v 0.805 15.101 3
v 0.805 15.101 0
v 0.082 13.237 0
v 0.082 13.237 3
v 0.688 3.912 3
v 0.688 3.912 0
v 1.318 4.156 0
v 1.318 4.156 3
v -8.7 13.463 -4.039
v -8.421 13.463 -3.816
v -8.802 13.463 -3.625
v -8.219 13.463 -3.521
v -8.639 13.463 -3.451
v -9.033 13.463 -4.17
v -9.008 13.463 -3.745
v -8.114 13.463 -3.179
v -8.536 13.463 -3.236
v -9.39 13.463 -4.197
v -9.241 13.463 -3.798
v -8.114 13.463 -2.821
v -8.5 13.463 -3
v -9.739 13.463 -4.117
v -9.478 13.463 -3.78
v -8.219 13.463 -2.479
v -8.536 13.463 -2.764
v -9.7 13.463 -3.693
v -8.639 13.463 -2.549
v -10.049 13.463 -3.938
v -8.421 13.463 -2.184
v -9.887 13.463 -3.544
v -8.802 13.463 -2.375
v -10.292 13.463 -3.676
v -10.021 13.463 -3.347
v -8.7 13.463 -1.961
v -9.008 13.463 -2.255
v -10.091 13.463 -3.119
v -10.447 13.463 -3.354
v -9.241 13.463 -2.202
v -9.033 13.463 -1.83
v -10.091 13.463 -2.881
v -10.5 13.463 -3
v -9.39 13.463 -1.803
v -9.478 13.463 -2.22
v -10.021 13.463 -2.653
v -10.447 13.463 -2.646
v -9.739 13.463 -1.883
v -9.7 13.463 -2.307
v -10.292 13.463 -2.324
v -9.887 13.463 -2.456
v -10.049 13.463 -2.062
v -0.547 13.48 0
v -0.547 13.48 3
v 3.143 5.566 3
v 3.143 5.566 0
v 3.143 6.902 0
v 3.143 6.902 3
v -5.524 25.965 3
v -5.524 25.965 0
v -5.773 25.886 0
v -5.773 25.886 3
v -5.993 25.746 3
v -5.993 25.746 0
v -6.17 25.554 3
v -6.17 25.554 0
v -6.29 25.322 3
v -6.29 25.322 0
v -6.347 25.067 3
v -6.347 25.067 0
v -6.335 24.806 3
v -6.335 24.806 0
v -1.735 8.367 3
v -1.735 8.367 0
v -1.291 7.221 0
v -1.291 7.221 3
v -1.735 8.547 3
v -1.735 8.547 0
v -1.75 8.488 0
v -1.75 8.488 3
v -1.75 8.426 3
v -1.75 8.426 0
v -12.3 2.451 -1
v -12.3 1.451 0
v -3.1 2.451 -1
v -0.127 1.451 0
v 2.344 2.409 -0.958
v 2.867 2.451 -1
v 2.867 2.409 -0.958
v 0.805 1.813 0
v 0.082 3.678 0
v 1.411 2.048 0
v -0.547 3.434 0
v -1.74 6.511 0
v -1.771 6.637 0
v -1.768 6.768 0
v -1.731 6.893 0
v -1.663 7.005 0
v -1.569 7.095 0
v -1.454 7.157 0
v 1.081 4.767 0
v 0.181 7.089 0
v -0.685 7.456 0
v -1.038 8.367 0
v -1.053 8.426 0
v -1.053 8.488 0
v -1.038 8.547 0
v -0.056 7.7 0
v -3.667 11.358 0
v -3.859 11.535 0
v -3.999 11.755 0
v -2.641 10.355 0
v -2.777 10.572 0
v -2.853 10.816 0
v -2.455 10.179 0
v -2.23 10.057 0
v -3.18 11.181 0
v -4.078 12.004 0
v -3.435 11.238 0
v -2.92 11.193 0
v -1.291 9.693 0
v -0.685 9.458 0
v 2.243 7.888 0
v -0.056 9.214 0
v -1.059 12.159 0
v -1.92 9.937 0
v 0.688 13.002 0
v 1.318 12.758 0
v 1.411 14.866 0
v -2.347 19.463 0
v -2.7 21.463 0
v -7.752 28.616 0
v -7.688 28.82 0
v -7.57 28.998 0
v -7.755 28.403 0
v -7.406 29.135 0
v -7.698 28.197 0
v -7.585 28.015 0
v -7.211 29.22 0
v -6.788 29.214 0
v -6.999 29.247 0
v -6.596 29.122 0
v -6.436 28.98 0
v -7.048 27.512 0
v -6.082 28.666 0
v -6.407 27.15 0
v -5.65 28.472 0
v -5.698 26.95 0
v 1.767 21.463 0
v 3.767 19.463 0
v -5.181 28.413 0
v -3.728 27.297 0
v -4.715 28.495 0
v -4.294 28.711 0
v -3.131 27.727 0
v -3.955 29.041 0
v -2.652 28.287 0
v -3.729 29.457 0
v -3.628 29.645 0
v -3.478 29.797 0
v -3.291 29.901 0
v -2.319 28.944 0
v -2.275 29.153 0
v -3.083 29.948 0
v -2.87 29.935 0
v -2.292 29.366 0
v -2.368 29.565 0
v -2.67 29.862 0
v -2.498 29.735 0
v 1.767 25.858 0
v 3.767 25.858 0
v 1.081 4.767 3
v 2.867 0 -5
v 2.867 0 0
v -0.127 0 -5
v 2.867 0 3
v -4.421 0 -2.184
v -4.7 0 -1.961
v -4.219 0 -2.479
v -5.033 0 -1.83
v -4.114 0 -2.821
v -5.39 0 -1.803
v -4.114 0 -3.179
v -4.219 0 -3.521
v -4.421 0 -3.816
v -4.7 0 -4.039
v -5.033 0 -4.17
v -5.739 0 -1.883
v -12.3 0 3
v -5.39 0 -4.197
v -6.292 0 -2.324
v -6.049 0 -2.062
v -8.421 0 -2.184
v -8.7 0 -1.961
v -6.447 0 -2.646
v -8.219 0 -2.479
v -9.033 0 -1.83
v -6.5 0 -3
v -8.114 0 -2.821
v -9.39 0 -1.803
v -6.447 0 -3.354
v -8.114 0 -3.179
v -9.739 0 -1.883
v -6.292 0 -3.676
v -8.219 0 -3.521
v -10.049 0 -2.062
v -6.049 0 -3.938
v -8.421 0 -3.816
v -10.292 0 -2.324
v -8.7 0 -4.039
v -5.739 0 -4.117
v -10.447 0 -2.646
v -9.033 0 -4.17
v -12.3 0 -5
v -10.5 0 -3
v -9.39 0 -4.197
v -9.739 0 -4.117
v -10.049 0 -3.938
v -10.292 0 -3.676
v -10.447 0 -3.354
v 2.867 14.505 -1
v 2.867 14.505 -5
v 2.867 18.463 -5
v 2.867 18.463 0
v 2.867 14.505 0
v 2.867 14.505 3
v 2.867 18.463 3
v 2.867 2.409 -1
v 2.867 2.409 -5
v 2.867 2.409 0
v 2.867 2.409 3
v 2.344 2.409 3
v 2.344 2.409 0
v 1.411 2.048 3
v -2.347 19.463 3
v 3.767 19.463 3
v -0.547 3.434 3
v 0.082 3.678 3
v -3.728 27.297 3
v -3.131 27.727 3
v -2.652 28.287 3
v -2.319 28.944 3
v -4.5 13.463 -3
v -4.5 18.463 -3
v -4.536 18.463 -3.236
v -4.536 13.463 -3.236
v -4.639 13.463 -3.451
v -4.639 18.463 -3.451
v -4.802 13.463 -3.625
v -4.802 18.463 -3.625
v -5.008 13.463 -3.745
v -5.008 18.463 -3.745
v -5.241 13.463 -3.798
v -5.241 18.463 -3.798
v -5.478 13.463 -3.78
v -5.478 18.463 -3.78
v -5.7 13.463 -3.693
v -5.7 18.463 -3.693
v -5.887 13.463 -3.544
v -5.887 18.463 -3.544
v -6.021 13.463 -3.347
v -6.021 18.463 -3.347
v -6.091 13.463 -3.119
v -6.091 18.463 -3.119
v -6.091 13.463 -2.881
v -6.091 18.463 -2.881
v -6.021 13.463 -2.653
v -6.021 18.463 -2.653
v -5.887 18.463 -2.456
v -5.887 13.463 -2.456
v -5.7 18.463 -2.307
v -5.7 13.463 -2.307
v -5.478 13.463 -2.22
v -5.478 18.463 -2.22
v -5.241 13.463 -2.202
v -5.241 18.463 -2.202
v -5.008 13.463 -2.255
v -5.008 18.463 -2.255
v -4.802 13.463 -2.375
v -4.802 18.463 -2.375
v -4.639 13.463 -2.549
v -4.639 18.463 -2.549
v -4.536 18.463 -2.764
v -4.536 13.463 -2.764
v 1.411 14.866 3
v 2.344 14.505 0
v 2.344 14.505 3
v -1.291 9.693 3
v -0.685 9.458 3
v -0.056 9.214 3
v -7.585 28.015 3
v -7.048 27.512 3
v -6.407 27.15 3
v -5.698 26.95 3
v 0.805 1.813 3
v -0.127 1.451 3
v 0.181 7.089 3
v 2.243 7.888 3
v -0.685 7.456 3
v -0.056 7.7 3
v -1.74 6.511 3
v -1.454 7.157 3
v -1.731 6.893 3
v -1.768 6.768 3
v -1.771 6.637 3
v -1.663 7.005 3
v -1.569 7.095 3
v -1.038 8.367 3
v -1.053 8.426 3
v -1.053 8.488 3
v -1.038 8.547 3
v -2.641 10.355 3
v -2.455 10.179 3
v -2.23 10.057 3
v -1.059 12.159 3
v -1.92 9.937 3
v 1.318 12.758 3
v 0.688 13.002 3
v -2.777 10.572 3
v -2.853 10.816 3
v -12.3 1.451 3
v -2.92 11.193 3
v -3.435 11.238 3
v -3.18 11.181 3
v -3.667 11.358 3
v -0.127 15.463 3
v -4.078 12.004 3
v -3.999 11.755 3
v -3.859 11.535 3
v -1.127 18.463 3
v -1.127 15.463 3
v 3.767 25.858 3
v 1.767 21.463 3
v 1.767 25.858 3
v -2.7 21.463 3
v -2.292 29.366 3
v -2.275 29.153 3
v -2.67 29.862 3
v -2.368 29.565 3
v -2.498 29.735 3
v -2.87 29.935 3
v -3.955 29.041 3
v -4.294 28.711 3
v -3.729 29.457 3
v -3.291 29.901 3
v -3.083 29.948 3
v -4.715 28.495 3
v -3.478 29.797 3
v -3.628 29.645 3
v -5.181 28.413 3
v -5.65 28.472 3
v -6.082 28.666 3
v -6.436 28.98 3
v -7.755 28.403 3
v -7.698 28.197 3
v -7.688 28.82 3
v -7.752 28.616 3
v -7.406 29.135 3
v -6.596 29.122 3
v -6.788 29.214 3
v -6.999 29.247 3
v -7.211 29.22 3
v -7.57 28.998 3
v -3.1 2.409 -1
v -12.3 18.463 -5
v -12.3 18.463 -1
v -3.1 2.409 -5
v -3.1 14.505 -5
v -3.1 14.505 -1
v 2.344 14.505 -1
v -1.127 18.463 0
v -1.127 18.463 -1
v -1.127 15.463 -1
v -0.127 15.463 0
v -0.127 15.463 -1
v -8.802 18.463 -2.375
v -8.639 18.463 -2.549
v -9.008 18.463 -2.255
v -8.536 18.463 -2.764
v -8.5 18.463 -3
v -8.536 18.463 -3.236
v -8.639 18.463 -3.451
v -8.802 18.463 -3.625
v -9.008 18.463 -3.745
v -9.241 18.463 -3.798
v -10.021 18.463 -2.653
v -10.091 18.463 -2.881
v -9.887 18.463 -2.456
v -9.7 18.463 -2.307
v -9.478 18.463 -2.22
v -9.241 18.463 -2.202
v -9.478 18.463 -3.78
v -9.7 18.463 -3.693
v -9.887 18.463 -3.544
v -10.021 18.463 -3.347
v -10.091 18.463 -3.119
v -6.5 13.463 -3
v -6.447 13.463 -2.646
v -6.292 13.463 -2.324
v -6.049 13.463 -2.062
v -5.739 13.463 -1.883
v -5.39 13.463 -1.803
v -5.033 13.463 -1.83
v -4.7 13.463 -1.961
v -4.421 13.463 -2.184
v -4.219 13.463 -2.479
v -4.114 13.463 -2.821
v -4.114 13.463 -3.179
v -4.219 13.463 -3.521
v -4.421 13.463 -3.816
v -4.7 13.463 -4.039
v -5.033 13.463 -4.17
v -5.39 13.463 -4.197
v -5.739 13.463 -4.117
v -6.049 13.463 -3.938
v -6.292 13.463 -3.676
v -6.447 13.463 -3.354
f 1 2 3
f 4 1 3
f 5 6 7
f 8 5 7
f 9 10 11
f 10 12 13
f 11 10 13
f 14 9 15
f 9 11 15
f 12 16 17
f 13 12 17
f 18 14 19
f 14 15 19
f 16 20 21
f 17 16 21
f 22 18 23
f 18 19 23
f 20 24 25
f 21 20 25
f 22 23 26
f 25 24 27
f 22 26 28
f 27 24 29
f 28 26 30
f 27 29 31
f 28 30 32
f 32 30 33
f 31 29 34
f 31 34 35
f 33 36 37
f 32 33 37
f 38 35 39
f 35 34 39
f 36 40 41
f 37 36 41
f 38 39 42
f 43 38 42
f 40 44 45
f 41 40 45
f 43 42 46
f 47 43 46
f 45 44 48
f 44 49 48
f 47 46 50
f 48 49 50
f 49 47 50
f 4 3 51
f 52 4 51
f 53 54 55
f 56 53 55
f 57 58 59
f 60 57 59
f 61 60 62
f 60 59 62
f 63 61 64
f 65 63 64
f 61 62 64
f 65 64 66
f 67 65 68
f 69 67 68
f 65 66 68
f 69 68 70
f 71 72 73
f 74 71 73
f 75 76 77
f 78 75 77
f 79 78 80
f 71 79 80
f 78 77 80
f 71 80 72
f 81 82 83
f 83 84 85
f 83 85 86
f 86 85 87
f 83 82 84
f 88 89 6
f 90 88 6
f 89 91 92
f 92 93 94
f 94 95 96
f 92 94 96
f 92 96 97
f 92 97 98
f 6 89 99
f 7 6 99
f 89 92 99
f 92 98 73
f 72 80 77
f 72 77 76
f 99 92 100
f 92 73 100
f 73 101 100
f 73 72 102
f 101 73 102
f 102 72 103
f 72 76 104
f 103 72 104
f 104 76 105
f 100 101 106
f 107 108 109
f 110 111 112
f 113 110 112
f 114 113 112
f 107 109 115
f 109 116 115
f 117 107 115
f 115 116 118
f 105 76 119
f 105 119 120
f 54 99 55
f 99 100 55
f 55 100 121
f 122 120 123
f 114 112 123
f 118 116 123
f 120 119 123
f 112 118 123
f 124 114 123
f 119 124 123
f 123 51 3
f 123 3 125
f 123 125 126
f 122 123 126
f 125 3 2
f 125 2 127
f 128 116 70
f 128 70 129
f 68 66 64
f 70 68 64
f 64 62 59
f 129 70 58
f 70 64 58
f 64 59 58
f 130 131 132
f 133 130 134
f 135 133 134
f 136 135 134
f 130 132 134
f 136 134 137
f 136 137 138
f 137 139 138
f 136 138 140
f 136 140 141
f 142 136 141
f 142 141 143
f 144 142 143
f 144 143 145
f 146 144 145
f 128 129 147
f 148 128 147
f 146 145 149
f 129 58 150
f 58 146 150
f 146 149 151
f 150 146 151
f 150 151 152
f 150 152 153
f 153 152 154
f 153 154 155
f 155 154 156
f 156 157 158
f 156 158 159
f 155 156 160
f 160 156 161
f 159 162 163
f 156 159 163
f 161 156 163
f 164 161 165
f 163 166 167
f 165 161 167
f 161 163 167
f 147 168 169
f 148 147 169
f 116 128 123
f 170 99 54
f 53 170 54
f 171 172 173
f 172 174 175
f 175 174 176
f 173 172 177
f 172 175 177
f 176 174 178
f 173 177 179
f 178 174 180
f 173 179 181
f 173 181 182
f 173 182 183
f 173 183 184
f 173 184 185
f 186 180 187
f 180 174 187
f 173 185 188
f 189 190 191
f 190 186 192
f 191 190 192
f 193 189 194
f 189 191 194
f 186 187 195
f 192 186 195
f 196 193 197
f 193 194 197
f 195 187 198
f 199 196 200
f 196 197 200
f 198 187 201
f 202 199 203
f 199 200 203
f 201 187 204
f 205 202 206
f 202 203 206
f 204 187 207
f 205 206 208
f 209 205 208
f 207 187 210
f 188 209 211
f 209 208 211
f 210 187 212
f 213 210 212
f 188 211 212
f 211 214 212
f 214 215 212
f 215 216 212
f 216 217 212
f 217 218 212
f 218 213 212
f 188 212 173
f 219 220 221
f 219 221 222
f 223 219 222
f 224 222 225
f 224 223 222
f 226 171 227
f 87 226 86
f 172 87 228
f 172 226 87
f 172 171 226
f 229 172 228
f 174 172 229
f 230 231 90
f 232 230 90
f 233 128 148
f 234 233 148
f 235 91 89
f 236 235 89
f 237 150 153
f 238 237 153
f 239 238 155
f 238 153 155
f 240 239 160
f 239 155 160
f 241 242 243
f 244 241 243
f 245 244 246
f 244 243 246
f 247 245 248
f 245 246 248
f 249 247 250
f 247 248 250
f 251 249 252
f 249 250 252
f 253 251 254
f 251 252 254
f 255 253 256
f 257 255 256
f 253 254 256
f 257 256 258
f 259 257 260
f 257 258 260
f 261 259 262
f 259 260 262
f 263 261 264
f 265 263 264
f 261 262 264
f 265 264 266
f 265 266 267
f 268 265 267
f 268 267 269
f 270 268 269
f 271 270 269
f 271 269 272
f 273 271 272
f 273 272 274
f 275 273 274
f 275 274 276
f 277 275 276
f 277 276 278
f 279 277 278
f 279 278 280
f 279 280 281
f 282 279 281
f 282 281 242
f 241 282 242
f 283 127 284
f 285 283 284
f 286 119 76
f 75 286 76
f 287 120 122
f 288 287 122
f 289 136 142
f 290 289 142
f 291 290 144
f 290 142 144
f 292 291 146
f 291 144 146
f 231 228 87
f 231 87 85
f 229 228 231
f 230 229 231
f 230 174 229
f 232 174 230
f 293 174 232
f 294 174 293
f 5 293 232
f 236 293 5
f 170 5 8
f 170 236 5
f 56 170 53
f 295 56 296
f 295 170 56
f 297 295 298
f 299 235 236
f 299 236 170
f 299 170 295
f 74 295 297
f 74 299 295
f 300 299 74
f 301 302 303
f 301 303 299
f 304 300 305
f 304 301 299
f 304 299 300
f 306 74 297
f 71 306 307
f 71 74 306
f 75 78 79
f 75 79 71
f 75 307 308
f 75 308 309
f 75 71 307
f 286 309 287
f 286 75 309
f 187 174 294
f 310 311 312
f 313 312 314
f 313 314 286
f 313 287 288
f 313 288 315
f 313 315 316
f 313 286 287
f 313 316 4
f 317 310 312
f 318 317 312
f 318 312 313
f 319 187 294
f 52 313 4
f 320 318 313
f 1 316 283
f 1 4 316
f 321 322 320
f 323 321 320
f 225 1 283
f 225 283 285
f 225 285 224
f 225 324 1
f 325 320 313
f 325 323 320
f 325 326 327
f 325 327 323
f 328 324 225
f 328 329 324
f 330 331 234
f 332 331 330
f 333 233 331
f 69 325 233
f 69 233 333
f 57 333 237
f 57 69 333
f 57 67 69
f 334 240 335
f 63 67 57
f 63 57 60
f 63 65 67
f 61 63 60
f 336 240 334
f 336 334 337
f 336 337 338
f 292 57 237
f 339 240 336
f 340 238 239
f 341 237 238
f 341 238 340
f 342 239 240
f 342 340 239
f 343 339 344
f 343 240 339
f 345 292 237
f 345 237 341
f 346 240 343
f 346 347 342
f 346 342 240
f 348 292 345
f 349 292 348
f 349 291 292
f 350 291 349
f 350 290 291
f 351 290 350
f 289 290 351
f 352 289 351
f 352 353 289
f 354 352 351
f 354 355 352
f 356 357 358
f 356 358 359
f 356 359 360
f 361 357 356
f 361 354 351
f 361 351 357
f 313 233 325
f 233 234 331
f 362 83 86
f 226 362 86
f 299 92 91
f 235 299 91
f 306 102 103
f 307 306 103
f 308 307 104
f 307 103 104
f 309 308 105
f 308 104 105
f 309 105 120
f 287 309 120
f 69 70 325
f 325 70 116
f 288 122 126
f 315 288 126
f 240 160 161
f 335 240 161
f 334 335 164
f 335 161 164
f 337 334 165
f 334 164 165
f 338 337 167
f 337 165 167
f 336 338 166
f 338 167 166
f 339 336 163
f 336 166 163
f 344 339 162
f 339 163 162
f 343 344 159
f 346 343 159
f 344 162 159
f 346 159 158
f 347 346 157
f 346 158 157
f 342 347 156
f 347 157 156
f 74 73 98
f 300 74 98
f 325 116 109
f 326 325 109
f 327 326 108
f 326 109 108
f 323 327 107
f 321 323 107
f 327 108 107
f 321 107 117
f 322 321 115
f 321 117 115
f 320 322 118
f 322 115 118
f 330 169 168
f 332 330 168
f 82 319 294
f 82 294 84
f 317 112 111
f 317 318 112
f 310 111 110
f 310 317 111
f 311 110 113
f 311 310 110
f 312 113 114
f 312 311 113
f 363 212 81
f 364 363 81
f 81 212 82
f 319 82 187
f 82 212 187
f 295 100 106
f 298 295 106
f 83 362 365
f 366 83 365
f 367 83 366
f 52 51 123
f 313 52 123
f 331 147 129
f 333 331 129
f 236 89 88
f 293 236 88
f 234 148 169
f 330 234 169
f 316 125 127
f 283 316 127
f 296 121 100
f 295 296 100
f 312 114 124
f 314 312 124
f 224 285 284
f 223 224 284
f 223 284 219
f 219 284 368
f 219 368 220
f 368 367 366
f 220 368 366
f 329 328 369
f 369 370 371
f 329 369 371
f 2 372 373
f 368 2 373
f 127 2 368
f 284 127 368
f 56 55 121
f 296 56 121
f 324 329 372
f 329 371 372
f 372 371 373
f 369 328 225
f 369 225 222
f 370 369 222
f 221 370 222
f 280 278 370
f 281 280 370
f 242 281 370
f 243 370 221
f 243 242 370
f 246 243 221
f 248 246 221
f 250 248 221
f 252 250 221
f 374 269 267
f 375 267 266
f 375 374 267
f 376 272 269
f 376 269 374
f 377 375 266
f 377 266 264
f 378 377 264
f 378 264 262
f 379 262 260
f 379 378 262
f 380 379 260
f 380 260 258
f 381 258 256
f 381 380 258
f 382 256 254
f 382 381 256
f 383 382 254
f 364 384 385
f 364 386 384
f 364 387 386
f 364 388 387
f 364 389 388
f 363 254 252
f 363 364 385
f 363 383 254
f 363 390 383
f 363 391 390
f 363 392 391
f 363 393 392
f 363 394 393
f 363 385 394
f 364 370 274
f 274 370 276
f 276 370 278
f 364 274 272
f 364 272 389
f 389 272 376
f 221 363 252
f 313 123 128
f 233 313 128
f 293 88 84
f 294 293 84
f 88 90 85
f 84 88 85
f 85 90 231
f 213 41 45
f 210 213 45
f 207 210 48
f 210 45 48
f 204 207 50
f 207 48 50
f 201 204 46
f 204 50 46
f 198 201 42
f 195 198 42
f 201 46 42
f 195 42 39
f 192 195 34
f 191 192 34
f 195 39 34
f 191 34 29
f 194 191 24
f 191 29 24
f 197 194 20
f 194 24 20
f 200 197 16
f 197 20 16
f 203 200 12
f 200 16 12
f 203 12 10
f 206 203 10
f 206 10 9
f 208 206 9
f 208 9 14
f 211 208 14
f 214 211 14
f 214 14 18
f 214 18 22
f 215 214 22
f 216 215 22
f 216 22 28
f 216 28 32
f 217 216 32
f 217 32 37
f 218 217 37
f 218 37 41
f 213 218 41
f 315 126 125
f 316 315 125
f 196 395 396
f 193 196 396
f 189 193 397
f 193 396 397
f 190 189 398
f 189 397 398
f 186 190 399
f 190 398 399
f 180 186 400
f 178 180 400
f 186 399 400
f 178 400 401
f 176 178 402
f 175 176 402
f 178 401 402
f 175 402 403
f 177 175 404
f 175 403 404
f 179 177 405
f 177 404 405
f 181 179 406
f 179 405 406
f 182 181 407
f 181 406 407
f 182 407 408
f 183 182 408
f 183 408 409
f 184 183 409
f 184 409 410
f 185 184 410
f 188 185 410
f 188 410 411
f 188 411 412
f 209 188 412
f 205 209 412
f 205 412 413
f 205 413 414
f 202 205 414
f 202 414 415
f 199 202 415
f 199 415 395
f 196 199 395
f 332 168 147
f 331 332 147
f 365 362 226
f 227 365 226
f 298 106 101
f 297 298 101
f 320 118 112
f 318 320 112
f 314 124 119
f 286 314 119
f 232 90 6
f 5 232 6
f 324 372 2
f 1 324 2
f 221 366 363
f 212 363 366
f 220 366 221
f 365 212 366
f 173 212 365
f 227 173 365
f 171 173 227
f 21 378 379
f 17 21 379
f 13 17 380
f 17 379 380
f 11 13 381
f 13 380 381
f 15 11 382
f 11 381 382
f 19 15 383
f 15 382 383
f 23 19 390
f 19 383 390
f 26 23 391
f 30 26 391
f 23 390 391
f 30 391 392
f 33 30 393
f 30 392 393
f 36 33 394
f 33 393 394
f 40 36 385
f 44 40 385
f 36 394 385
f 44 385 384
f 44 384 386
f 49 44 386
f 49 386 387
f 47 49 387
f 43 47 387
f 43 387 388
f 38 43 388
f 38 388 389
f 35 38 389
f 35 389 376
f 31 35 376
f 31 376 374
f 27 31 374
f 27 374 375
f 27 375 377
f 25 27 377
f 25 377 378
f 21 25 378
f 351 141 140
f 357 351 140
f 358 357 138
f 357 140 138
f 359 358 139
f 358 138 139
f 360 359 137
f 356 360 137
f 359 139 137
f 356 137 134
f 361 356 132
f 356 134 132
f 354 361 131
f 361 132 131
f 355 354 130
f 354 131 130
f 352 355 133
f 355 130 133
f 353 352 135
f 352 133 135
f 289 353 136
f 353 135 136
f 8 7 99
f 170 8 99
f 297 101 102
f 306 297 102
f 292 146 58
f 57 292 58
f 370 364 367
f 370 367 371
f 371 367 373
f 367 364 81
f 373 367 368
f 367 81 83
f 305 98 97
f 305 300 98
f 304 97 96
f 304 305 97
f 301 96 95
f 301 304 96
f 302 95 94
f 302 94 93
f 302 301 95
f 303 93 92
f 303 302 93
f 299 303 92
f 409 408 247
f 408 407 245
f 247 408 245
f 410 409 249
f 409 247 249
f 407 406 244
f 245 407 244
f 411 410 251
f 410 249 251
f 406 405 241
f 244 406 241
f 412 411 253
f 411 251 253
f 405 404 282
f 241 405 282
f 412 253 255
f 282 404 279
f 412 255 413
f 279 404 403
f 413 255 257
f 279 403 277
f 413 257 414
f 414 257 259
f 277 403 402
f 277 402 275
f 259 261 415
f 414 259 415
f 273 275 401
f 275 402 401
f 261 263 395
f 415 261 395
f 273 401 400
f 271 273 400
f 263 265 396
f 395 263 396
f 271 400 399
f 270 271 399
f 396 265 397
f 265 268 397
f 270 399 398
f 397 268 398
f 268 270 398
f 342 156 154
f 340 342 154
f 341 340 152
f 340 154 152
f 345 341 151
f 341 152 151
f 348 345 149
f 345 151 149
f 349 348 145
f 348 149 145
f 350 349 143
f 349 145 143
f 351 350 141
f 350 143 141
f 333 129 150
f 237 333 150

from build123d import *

# Parameters (mm, degrees)
BOSS_SWITCH_BODY_DEPTH            = 3
SKETCH1_W                         = 2.994375291
SKETCH1_H                         = 2.409101515
SKETCH1_W_2                       = 3.994375291
SKETCH1_H_2                       = 3.957767538
BOSS_FLANGE_WIDTH_DEPTH           = 5
BOSS_FLANGE_HEIGHT_REACH          = 36.354
SKETCH2_W                         = 4
SKETCH2_H                         = 3.957767538
SKETCH2_W_2                       = 8
SKETCH2_H_2                       = 1.451333978
SKETCH17_W                        = 15.1675
SKETCH17_H                        = 4
BOSS_FLANGE_SUPPORT_DEPTH         = 13.053634428
CUT_WALL_GAP_DEPTH                = 1
TAP_DRILL_FOR_M2X0_4_TAP1_D       = 1.6
M2_CLEARANCE_HOLE2_D              = 2.4
M2_CLEARANCE_HOLE2_DEPTH          = 13.462735941
CHAMFER_FLANGE_SUPPORT_3_SIZE     = 1
FILLET1_R                         = 1
FILLET2_R                         = 0.5
SKETCH28_W                        = 5.9675
SKETCH28_H                        = 12.095866891
CUT_PRINT_SUPPORT_CLEARANCE_DEPTH = 33.624103931


with BuildPart() as part:
    # Sketch-SwitchBossUp → Boss-Switch Body (new body)
    with BuildSketch(Plane.XY):
        with BuildLine():
            Line((-5.697895702, 26.949658376), (-5.524247524, 25.964850623))
            ThreePointArc((-5.524247524, 25.964850623), (-6.169751391, 25.553619307), (-6.3354071, 24.806394693))
            Line((-6.3354071, 24.806394693), (-4.07798079, 12.003893904))
            ThreePointArc((-4.07798079, 12.003893904), (-3.666749473, 11.358390037), (-2.919524859, 11.192734328))
            Line((-2.919524859, 11.192734328), (-2.755222696, 10.260930457))
            Line((-2.755222696, 10.260930457), (-1.920417042, 9.937339624))
            Line((-1.920417042, 9.937339624), (-1.291045382, 9.693379968))
            Line((-1.291045382, 9.693379968), (-1.735258621, 8.547390389))
            ThreePointArc((-1.735258621, 8.547390389), (-1.752158006, 8.457034961), (-1.735258621, 8.366679532))
            Line((-1.735258621, 8.366679532), (-1.291045382, 7.220689953))
            Line((-1.291045382, 7.220689953), (-1.920417042, 6.976730297))
            Line((-1.920417042, 6.976730297), (-0.547014535, 3.433600952))
            Line((-0.547014535, 3.433600952), (0.082357125, 3.677560608))
            Line((0.082357125, 3.677560608), (0.805200549, 1.81275569))
            Line((0.805200549, 1.81275569), (-0.12720191, 1.451333978))
            Line((-0.12720191, 1.451333978), (-0.12720191, 0))
            Line((-0.12720191, 0), (2.867173381, 0))
            Line((2.867173381, 0), (2.867173381, 2.409101515))
            Line((2.867173381, 2.409101515), (2.343664607, 2.409101515))
            Line((2.343664607, 2.409101515), (1.411262148, 2.047679803))
            Line((1.411262148, 2.047679803), (0.688418723, 3.912484721))
            Line((0.688418723, 3.912484721), (1.317790383, 4.156444377))
            Line((1.317790383, 4.156444377), (1.081123773, 4.767001302))
            Line((1.081123773, 4.767001302), (3.143260738, 5.566335394))
            Line((3.143260738, 5.566335394), (3.143260738, 6.901787438))
            Line((3.143260738, 6.901787438), (2.24307649, 7.888306327))
            Line((2.24307649, 7.888306327), (0.181054486, 7.089016797))
            Line((0.181054486, 7.089016797), (-0.055612124, 7.699573722))
            Line((-0.055612124, 7.699573722), (-0.684983784, 7.455614066))
            Line((-0.684983784, 7.455614066), (-1.038134762, 8.366679532))
            ThreePointArc((-1.038134762, 8.366679532), (-1.055034148, 8.457034961), (-1.038134762, 8.547390389))
            Line((-1.038134762, 8.547390389), (-0.684983784, 9.458455855))
            Line((-0.684983784, 9.458455855), (-0.055612124, 9.214496199))
            Line((-0.055612124, 9.214496199), (1.317790383, 12.757625544))
            Line((1.317790383, 12.757625544), (0.688418723, 13.0015852))
            Line((0.688418723, 13.0015852), (1.411262148, 14.866390118))
            Line((1.411262148, 14.866390118), (2.343664607, 14.504968406))
            Line((2.343664607, 14.504968406), (2.867173381, 14.504968406))
            Line((2.867173381, 14.504968406), (2.867173381, 18.462735944))
            Line((2.867173381, 18.462735944), (-0.111637615, 18.462735944))
            Line((-0.111637615, 18.462735944), (-1.12720191, 18.462735944))
            Line((-1.12720191, 18.462735944), (-1.12720191, 15.462735944))
            Line((-1.12720191, 15.462735944), (-0.12720191, 15.462735944))
            Line((-0.12720191, 15.462735944), (0.805200549, 15.101314231))
            Line((0.805200549, 15.101314231), (0.082357125, 13.236509313))
            Line((0.082357125, 13.236509313), (-0.547014535, 13.480468969))
            Line((-0.547014535, 13.480468969), (-1.059112089, 12.159350171))
            Line((-1.059112089, 12.159350171), (-2.346896051, 19.462735944))
            Line((-2.346896051, 19.462735944), (3.767173381, 19.462735944))
            Line((3.767173381, 19.462735944), (3.767173381, 25.857619356))
            Line((3.767173381, 25.857619356), (1.767173381, 25.857619356))
            Line((1.767173381, 25.857619356), (1.767173381, 21.462735944))
            Line((1.767173381, 21.462735944), (-2.699550012, 21.462735944))
            Line((-2.699550012, 21.462735944), (-3.728280196, 27.296954732))
            ThreePointArc((-3.728280196, 27.296954732), (-2.874356585, 27.992742953), (-2.319025652, 28.944012807))
            ThreePointArc((-2.319025652, 28.944012807), (-2.76728001, 29.905297381), (-3.728564583, 29.457043022))
            ThreePointArc((-3.728564583, 29.457043022), (-4.944660137, 28.436617692), (-6.436422172, 28.97957467))
            ThreePointArc((-6.436422172, 28.97957467), (-7.493046212, 29.072017295), (-7.585488837, 28.015393255))
            ThreePointArc((-7.585488837, 28.015393255), (-6.738295005, 27.311426358), (-5.697895702, 26.949658376))
        make_face()
    extrude(amount=BOSS_SWITCH_BODY_DEPTH)

    # Sketch1 → Boss-Flange Width (add)
    with BuildSketch(Plane(origin=(0, 0, 0), x_dir=(-1, 0, 0), z_dir=(0, 0, -1))):
        with Locations((-1.369985736, 1.204550758)):
            Rectangle(SKETCH1_W, SKETCH1_H)
        with Locations((-0.869985736, 16.483852175)):
            Rectangle(SKETCH1_W_2, SKETCH1_H_2)
    extrude(amount=BOSS_FLANGE_WIDTH_DEPTH)

    # Boss-Flange Height: up to this face of the body (flat: up to its plane)
    boss_flange_height_end = Plane(part.part.faces().sort_by_distance((-0.12720191, 1.077409098, -1.438016547))[0])
    # Sketch2 → Boss-Flange Height (add, up to the picked face)
    with BuildSketch(Plane(origin=(-12.300326619, 0, 0), x_dir=(0, 0, -1), z_dir=(1, 0, 0)), mode=Mode.PRIVATE) as boss_flange_height_sk1:
        with Locations((3, 16.483852175)):
            Rectangle(SKETCH2_W, SKETCH2_H)
    boss_flange_height_tool1 = split(extrude(boss_flange_height_sk1.sketch, amount=BOSS_FLANGE_HEIGHT_REACH, mode=Mode.PRIVATE), bisect_by=boss_flange_height_end, keep=Keep.BOTH, mode=Mode.PRIVATE)
    # Sketch2 → Boss-Flange Height (add, up to the picked face)
    with BuildSketch(Plane(origin=(-12.300326619, 0, 0), x_dir=(0, 0, -1), z_dir=(1, 0, 0)), mode=Mode.PRIVATE) as boss_flange_height_sk2:
        with Locations((1, 0.725666989)):
            Rectangle(SKETCH2_W_2, SKETCH2_H_2)
    boss_flange_height_tool2 = split(extrude(boss_flange_height_sk2.sketch, amount=BOSS_FLANGE_HEIGHT_REACH, mode=Mode.PRIVATE), bisect_by=boss_flange_height_end, keep=Keep.BOTH, mode=Mode.PRIVATE)
    add(boss_flange_height_tool1.solids().sort_by(Axis((-12.300327, 16.483852, -3), (1, 0, 0)))[0])
    add(boss_flange_height_tool2.solids().sort_by(Axis((-12.300327, 0.725667, -1), (1, 0, 0)))[0])

    # Sketch17 → Boss-Flange Support (add)
    with BuildSketch(Plane.XZ.offset(-1.451333978)):
        with Locations((-4.716576619, -3)):
            Rectangle(SKETCH17_W, SKETCH17_H)
    extrude(amount=-BOSS_FLANGE_SUPPORT_DEPTH)

    # Sketch27 → Cut-Wall Gap (cut)
    with BuildSketch(Plane.XY):
        Polygon((-0.12720191, 15.462735944), (2.343664607, 14.504968406), (-1.12720191, 14.504968406), (-1.12720191, 15.462735944), align=None)
        Polygon((2.343664607, 2.409101515), (-0.12720191, 2.409101515), (-0.12720191, 1.451333978), align=None)
    extrude(amount=-CUT_WALL_GAP_DEPTH, mode=Mode.SUBTRACT)

    # Tap Drill for M2x0.4 Tap1 (through all)
    with Locations(Plane(origin=(0, 0, 0), x_dir=(-1, 0, 0), z_dir=(0, -1, 0))):
        with Locations((9.300326619, 3), (5.300326619, 3)):
            Hole(TAP_DRILL_FOR_M2X0_4_TAP1_D / 2)

    # M2 Clearance Hole2
    with Locations(Plane.XZ):
        with Locations((-9.300326619, -3), (-5.300326619, -3)):
            Hole(M2_CLEARANCE_HOLE2_D / 2, depth=M2_CLEARANCE_HOLE2_DEPTH)

    # Chamfer-Flange Support 3
    chamfer_flange_support_3_edges = [part.edges().sort_by_distance(p)[0] for p in [
        (-6.213764264, 1.451333978, -1),
    ]]
    chamfer(chamfer_flange_support_3_edges, length=CHAMFER_FLANGE_SUPPORT_3_SIZE)

    # Fillet1
    fillet1_edges = [part.edges().sort_by_distance(p)[0] for p in [
        (-2.755222696, 10.260930457, 1.5),
    ]]
    fillet(fillet1_edges, radius=FILLET1_R)

    # Fillet2
    fillet2_edges = [part.edges().sort_by_distance(p)[0] for p in [
        (-1.920417042, 6.976730297, 1.5),
    ]]
    fillet(fillet2_edges, radius=FILLET2_R)

    # Sketch28 → Cut-Print Support Clearance (cut, through all)
    with BuildSketch(Plane.XY.offset(-1)):
        with Locations((-0.116576619, 8.457034961)):
            Rectangle(SKETCH28_W, SKETCH28_H)
    extrude(amount=-CUT_PRINT_SUPPORT_CLEARANCE_DEPTH, mode=Mode.SUBTRACT)


solid = part.part
